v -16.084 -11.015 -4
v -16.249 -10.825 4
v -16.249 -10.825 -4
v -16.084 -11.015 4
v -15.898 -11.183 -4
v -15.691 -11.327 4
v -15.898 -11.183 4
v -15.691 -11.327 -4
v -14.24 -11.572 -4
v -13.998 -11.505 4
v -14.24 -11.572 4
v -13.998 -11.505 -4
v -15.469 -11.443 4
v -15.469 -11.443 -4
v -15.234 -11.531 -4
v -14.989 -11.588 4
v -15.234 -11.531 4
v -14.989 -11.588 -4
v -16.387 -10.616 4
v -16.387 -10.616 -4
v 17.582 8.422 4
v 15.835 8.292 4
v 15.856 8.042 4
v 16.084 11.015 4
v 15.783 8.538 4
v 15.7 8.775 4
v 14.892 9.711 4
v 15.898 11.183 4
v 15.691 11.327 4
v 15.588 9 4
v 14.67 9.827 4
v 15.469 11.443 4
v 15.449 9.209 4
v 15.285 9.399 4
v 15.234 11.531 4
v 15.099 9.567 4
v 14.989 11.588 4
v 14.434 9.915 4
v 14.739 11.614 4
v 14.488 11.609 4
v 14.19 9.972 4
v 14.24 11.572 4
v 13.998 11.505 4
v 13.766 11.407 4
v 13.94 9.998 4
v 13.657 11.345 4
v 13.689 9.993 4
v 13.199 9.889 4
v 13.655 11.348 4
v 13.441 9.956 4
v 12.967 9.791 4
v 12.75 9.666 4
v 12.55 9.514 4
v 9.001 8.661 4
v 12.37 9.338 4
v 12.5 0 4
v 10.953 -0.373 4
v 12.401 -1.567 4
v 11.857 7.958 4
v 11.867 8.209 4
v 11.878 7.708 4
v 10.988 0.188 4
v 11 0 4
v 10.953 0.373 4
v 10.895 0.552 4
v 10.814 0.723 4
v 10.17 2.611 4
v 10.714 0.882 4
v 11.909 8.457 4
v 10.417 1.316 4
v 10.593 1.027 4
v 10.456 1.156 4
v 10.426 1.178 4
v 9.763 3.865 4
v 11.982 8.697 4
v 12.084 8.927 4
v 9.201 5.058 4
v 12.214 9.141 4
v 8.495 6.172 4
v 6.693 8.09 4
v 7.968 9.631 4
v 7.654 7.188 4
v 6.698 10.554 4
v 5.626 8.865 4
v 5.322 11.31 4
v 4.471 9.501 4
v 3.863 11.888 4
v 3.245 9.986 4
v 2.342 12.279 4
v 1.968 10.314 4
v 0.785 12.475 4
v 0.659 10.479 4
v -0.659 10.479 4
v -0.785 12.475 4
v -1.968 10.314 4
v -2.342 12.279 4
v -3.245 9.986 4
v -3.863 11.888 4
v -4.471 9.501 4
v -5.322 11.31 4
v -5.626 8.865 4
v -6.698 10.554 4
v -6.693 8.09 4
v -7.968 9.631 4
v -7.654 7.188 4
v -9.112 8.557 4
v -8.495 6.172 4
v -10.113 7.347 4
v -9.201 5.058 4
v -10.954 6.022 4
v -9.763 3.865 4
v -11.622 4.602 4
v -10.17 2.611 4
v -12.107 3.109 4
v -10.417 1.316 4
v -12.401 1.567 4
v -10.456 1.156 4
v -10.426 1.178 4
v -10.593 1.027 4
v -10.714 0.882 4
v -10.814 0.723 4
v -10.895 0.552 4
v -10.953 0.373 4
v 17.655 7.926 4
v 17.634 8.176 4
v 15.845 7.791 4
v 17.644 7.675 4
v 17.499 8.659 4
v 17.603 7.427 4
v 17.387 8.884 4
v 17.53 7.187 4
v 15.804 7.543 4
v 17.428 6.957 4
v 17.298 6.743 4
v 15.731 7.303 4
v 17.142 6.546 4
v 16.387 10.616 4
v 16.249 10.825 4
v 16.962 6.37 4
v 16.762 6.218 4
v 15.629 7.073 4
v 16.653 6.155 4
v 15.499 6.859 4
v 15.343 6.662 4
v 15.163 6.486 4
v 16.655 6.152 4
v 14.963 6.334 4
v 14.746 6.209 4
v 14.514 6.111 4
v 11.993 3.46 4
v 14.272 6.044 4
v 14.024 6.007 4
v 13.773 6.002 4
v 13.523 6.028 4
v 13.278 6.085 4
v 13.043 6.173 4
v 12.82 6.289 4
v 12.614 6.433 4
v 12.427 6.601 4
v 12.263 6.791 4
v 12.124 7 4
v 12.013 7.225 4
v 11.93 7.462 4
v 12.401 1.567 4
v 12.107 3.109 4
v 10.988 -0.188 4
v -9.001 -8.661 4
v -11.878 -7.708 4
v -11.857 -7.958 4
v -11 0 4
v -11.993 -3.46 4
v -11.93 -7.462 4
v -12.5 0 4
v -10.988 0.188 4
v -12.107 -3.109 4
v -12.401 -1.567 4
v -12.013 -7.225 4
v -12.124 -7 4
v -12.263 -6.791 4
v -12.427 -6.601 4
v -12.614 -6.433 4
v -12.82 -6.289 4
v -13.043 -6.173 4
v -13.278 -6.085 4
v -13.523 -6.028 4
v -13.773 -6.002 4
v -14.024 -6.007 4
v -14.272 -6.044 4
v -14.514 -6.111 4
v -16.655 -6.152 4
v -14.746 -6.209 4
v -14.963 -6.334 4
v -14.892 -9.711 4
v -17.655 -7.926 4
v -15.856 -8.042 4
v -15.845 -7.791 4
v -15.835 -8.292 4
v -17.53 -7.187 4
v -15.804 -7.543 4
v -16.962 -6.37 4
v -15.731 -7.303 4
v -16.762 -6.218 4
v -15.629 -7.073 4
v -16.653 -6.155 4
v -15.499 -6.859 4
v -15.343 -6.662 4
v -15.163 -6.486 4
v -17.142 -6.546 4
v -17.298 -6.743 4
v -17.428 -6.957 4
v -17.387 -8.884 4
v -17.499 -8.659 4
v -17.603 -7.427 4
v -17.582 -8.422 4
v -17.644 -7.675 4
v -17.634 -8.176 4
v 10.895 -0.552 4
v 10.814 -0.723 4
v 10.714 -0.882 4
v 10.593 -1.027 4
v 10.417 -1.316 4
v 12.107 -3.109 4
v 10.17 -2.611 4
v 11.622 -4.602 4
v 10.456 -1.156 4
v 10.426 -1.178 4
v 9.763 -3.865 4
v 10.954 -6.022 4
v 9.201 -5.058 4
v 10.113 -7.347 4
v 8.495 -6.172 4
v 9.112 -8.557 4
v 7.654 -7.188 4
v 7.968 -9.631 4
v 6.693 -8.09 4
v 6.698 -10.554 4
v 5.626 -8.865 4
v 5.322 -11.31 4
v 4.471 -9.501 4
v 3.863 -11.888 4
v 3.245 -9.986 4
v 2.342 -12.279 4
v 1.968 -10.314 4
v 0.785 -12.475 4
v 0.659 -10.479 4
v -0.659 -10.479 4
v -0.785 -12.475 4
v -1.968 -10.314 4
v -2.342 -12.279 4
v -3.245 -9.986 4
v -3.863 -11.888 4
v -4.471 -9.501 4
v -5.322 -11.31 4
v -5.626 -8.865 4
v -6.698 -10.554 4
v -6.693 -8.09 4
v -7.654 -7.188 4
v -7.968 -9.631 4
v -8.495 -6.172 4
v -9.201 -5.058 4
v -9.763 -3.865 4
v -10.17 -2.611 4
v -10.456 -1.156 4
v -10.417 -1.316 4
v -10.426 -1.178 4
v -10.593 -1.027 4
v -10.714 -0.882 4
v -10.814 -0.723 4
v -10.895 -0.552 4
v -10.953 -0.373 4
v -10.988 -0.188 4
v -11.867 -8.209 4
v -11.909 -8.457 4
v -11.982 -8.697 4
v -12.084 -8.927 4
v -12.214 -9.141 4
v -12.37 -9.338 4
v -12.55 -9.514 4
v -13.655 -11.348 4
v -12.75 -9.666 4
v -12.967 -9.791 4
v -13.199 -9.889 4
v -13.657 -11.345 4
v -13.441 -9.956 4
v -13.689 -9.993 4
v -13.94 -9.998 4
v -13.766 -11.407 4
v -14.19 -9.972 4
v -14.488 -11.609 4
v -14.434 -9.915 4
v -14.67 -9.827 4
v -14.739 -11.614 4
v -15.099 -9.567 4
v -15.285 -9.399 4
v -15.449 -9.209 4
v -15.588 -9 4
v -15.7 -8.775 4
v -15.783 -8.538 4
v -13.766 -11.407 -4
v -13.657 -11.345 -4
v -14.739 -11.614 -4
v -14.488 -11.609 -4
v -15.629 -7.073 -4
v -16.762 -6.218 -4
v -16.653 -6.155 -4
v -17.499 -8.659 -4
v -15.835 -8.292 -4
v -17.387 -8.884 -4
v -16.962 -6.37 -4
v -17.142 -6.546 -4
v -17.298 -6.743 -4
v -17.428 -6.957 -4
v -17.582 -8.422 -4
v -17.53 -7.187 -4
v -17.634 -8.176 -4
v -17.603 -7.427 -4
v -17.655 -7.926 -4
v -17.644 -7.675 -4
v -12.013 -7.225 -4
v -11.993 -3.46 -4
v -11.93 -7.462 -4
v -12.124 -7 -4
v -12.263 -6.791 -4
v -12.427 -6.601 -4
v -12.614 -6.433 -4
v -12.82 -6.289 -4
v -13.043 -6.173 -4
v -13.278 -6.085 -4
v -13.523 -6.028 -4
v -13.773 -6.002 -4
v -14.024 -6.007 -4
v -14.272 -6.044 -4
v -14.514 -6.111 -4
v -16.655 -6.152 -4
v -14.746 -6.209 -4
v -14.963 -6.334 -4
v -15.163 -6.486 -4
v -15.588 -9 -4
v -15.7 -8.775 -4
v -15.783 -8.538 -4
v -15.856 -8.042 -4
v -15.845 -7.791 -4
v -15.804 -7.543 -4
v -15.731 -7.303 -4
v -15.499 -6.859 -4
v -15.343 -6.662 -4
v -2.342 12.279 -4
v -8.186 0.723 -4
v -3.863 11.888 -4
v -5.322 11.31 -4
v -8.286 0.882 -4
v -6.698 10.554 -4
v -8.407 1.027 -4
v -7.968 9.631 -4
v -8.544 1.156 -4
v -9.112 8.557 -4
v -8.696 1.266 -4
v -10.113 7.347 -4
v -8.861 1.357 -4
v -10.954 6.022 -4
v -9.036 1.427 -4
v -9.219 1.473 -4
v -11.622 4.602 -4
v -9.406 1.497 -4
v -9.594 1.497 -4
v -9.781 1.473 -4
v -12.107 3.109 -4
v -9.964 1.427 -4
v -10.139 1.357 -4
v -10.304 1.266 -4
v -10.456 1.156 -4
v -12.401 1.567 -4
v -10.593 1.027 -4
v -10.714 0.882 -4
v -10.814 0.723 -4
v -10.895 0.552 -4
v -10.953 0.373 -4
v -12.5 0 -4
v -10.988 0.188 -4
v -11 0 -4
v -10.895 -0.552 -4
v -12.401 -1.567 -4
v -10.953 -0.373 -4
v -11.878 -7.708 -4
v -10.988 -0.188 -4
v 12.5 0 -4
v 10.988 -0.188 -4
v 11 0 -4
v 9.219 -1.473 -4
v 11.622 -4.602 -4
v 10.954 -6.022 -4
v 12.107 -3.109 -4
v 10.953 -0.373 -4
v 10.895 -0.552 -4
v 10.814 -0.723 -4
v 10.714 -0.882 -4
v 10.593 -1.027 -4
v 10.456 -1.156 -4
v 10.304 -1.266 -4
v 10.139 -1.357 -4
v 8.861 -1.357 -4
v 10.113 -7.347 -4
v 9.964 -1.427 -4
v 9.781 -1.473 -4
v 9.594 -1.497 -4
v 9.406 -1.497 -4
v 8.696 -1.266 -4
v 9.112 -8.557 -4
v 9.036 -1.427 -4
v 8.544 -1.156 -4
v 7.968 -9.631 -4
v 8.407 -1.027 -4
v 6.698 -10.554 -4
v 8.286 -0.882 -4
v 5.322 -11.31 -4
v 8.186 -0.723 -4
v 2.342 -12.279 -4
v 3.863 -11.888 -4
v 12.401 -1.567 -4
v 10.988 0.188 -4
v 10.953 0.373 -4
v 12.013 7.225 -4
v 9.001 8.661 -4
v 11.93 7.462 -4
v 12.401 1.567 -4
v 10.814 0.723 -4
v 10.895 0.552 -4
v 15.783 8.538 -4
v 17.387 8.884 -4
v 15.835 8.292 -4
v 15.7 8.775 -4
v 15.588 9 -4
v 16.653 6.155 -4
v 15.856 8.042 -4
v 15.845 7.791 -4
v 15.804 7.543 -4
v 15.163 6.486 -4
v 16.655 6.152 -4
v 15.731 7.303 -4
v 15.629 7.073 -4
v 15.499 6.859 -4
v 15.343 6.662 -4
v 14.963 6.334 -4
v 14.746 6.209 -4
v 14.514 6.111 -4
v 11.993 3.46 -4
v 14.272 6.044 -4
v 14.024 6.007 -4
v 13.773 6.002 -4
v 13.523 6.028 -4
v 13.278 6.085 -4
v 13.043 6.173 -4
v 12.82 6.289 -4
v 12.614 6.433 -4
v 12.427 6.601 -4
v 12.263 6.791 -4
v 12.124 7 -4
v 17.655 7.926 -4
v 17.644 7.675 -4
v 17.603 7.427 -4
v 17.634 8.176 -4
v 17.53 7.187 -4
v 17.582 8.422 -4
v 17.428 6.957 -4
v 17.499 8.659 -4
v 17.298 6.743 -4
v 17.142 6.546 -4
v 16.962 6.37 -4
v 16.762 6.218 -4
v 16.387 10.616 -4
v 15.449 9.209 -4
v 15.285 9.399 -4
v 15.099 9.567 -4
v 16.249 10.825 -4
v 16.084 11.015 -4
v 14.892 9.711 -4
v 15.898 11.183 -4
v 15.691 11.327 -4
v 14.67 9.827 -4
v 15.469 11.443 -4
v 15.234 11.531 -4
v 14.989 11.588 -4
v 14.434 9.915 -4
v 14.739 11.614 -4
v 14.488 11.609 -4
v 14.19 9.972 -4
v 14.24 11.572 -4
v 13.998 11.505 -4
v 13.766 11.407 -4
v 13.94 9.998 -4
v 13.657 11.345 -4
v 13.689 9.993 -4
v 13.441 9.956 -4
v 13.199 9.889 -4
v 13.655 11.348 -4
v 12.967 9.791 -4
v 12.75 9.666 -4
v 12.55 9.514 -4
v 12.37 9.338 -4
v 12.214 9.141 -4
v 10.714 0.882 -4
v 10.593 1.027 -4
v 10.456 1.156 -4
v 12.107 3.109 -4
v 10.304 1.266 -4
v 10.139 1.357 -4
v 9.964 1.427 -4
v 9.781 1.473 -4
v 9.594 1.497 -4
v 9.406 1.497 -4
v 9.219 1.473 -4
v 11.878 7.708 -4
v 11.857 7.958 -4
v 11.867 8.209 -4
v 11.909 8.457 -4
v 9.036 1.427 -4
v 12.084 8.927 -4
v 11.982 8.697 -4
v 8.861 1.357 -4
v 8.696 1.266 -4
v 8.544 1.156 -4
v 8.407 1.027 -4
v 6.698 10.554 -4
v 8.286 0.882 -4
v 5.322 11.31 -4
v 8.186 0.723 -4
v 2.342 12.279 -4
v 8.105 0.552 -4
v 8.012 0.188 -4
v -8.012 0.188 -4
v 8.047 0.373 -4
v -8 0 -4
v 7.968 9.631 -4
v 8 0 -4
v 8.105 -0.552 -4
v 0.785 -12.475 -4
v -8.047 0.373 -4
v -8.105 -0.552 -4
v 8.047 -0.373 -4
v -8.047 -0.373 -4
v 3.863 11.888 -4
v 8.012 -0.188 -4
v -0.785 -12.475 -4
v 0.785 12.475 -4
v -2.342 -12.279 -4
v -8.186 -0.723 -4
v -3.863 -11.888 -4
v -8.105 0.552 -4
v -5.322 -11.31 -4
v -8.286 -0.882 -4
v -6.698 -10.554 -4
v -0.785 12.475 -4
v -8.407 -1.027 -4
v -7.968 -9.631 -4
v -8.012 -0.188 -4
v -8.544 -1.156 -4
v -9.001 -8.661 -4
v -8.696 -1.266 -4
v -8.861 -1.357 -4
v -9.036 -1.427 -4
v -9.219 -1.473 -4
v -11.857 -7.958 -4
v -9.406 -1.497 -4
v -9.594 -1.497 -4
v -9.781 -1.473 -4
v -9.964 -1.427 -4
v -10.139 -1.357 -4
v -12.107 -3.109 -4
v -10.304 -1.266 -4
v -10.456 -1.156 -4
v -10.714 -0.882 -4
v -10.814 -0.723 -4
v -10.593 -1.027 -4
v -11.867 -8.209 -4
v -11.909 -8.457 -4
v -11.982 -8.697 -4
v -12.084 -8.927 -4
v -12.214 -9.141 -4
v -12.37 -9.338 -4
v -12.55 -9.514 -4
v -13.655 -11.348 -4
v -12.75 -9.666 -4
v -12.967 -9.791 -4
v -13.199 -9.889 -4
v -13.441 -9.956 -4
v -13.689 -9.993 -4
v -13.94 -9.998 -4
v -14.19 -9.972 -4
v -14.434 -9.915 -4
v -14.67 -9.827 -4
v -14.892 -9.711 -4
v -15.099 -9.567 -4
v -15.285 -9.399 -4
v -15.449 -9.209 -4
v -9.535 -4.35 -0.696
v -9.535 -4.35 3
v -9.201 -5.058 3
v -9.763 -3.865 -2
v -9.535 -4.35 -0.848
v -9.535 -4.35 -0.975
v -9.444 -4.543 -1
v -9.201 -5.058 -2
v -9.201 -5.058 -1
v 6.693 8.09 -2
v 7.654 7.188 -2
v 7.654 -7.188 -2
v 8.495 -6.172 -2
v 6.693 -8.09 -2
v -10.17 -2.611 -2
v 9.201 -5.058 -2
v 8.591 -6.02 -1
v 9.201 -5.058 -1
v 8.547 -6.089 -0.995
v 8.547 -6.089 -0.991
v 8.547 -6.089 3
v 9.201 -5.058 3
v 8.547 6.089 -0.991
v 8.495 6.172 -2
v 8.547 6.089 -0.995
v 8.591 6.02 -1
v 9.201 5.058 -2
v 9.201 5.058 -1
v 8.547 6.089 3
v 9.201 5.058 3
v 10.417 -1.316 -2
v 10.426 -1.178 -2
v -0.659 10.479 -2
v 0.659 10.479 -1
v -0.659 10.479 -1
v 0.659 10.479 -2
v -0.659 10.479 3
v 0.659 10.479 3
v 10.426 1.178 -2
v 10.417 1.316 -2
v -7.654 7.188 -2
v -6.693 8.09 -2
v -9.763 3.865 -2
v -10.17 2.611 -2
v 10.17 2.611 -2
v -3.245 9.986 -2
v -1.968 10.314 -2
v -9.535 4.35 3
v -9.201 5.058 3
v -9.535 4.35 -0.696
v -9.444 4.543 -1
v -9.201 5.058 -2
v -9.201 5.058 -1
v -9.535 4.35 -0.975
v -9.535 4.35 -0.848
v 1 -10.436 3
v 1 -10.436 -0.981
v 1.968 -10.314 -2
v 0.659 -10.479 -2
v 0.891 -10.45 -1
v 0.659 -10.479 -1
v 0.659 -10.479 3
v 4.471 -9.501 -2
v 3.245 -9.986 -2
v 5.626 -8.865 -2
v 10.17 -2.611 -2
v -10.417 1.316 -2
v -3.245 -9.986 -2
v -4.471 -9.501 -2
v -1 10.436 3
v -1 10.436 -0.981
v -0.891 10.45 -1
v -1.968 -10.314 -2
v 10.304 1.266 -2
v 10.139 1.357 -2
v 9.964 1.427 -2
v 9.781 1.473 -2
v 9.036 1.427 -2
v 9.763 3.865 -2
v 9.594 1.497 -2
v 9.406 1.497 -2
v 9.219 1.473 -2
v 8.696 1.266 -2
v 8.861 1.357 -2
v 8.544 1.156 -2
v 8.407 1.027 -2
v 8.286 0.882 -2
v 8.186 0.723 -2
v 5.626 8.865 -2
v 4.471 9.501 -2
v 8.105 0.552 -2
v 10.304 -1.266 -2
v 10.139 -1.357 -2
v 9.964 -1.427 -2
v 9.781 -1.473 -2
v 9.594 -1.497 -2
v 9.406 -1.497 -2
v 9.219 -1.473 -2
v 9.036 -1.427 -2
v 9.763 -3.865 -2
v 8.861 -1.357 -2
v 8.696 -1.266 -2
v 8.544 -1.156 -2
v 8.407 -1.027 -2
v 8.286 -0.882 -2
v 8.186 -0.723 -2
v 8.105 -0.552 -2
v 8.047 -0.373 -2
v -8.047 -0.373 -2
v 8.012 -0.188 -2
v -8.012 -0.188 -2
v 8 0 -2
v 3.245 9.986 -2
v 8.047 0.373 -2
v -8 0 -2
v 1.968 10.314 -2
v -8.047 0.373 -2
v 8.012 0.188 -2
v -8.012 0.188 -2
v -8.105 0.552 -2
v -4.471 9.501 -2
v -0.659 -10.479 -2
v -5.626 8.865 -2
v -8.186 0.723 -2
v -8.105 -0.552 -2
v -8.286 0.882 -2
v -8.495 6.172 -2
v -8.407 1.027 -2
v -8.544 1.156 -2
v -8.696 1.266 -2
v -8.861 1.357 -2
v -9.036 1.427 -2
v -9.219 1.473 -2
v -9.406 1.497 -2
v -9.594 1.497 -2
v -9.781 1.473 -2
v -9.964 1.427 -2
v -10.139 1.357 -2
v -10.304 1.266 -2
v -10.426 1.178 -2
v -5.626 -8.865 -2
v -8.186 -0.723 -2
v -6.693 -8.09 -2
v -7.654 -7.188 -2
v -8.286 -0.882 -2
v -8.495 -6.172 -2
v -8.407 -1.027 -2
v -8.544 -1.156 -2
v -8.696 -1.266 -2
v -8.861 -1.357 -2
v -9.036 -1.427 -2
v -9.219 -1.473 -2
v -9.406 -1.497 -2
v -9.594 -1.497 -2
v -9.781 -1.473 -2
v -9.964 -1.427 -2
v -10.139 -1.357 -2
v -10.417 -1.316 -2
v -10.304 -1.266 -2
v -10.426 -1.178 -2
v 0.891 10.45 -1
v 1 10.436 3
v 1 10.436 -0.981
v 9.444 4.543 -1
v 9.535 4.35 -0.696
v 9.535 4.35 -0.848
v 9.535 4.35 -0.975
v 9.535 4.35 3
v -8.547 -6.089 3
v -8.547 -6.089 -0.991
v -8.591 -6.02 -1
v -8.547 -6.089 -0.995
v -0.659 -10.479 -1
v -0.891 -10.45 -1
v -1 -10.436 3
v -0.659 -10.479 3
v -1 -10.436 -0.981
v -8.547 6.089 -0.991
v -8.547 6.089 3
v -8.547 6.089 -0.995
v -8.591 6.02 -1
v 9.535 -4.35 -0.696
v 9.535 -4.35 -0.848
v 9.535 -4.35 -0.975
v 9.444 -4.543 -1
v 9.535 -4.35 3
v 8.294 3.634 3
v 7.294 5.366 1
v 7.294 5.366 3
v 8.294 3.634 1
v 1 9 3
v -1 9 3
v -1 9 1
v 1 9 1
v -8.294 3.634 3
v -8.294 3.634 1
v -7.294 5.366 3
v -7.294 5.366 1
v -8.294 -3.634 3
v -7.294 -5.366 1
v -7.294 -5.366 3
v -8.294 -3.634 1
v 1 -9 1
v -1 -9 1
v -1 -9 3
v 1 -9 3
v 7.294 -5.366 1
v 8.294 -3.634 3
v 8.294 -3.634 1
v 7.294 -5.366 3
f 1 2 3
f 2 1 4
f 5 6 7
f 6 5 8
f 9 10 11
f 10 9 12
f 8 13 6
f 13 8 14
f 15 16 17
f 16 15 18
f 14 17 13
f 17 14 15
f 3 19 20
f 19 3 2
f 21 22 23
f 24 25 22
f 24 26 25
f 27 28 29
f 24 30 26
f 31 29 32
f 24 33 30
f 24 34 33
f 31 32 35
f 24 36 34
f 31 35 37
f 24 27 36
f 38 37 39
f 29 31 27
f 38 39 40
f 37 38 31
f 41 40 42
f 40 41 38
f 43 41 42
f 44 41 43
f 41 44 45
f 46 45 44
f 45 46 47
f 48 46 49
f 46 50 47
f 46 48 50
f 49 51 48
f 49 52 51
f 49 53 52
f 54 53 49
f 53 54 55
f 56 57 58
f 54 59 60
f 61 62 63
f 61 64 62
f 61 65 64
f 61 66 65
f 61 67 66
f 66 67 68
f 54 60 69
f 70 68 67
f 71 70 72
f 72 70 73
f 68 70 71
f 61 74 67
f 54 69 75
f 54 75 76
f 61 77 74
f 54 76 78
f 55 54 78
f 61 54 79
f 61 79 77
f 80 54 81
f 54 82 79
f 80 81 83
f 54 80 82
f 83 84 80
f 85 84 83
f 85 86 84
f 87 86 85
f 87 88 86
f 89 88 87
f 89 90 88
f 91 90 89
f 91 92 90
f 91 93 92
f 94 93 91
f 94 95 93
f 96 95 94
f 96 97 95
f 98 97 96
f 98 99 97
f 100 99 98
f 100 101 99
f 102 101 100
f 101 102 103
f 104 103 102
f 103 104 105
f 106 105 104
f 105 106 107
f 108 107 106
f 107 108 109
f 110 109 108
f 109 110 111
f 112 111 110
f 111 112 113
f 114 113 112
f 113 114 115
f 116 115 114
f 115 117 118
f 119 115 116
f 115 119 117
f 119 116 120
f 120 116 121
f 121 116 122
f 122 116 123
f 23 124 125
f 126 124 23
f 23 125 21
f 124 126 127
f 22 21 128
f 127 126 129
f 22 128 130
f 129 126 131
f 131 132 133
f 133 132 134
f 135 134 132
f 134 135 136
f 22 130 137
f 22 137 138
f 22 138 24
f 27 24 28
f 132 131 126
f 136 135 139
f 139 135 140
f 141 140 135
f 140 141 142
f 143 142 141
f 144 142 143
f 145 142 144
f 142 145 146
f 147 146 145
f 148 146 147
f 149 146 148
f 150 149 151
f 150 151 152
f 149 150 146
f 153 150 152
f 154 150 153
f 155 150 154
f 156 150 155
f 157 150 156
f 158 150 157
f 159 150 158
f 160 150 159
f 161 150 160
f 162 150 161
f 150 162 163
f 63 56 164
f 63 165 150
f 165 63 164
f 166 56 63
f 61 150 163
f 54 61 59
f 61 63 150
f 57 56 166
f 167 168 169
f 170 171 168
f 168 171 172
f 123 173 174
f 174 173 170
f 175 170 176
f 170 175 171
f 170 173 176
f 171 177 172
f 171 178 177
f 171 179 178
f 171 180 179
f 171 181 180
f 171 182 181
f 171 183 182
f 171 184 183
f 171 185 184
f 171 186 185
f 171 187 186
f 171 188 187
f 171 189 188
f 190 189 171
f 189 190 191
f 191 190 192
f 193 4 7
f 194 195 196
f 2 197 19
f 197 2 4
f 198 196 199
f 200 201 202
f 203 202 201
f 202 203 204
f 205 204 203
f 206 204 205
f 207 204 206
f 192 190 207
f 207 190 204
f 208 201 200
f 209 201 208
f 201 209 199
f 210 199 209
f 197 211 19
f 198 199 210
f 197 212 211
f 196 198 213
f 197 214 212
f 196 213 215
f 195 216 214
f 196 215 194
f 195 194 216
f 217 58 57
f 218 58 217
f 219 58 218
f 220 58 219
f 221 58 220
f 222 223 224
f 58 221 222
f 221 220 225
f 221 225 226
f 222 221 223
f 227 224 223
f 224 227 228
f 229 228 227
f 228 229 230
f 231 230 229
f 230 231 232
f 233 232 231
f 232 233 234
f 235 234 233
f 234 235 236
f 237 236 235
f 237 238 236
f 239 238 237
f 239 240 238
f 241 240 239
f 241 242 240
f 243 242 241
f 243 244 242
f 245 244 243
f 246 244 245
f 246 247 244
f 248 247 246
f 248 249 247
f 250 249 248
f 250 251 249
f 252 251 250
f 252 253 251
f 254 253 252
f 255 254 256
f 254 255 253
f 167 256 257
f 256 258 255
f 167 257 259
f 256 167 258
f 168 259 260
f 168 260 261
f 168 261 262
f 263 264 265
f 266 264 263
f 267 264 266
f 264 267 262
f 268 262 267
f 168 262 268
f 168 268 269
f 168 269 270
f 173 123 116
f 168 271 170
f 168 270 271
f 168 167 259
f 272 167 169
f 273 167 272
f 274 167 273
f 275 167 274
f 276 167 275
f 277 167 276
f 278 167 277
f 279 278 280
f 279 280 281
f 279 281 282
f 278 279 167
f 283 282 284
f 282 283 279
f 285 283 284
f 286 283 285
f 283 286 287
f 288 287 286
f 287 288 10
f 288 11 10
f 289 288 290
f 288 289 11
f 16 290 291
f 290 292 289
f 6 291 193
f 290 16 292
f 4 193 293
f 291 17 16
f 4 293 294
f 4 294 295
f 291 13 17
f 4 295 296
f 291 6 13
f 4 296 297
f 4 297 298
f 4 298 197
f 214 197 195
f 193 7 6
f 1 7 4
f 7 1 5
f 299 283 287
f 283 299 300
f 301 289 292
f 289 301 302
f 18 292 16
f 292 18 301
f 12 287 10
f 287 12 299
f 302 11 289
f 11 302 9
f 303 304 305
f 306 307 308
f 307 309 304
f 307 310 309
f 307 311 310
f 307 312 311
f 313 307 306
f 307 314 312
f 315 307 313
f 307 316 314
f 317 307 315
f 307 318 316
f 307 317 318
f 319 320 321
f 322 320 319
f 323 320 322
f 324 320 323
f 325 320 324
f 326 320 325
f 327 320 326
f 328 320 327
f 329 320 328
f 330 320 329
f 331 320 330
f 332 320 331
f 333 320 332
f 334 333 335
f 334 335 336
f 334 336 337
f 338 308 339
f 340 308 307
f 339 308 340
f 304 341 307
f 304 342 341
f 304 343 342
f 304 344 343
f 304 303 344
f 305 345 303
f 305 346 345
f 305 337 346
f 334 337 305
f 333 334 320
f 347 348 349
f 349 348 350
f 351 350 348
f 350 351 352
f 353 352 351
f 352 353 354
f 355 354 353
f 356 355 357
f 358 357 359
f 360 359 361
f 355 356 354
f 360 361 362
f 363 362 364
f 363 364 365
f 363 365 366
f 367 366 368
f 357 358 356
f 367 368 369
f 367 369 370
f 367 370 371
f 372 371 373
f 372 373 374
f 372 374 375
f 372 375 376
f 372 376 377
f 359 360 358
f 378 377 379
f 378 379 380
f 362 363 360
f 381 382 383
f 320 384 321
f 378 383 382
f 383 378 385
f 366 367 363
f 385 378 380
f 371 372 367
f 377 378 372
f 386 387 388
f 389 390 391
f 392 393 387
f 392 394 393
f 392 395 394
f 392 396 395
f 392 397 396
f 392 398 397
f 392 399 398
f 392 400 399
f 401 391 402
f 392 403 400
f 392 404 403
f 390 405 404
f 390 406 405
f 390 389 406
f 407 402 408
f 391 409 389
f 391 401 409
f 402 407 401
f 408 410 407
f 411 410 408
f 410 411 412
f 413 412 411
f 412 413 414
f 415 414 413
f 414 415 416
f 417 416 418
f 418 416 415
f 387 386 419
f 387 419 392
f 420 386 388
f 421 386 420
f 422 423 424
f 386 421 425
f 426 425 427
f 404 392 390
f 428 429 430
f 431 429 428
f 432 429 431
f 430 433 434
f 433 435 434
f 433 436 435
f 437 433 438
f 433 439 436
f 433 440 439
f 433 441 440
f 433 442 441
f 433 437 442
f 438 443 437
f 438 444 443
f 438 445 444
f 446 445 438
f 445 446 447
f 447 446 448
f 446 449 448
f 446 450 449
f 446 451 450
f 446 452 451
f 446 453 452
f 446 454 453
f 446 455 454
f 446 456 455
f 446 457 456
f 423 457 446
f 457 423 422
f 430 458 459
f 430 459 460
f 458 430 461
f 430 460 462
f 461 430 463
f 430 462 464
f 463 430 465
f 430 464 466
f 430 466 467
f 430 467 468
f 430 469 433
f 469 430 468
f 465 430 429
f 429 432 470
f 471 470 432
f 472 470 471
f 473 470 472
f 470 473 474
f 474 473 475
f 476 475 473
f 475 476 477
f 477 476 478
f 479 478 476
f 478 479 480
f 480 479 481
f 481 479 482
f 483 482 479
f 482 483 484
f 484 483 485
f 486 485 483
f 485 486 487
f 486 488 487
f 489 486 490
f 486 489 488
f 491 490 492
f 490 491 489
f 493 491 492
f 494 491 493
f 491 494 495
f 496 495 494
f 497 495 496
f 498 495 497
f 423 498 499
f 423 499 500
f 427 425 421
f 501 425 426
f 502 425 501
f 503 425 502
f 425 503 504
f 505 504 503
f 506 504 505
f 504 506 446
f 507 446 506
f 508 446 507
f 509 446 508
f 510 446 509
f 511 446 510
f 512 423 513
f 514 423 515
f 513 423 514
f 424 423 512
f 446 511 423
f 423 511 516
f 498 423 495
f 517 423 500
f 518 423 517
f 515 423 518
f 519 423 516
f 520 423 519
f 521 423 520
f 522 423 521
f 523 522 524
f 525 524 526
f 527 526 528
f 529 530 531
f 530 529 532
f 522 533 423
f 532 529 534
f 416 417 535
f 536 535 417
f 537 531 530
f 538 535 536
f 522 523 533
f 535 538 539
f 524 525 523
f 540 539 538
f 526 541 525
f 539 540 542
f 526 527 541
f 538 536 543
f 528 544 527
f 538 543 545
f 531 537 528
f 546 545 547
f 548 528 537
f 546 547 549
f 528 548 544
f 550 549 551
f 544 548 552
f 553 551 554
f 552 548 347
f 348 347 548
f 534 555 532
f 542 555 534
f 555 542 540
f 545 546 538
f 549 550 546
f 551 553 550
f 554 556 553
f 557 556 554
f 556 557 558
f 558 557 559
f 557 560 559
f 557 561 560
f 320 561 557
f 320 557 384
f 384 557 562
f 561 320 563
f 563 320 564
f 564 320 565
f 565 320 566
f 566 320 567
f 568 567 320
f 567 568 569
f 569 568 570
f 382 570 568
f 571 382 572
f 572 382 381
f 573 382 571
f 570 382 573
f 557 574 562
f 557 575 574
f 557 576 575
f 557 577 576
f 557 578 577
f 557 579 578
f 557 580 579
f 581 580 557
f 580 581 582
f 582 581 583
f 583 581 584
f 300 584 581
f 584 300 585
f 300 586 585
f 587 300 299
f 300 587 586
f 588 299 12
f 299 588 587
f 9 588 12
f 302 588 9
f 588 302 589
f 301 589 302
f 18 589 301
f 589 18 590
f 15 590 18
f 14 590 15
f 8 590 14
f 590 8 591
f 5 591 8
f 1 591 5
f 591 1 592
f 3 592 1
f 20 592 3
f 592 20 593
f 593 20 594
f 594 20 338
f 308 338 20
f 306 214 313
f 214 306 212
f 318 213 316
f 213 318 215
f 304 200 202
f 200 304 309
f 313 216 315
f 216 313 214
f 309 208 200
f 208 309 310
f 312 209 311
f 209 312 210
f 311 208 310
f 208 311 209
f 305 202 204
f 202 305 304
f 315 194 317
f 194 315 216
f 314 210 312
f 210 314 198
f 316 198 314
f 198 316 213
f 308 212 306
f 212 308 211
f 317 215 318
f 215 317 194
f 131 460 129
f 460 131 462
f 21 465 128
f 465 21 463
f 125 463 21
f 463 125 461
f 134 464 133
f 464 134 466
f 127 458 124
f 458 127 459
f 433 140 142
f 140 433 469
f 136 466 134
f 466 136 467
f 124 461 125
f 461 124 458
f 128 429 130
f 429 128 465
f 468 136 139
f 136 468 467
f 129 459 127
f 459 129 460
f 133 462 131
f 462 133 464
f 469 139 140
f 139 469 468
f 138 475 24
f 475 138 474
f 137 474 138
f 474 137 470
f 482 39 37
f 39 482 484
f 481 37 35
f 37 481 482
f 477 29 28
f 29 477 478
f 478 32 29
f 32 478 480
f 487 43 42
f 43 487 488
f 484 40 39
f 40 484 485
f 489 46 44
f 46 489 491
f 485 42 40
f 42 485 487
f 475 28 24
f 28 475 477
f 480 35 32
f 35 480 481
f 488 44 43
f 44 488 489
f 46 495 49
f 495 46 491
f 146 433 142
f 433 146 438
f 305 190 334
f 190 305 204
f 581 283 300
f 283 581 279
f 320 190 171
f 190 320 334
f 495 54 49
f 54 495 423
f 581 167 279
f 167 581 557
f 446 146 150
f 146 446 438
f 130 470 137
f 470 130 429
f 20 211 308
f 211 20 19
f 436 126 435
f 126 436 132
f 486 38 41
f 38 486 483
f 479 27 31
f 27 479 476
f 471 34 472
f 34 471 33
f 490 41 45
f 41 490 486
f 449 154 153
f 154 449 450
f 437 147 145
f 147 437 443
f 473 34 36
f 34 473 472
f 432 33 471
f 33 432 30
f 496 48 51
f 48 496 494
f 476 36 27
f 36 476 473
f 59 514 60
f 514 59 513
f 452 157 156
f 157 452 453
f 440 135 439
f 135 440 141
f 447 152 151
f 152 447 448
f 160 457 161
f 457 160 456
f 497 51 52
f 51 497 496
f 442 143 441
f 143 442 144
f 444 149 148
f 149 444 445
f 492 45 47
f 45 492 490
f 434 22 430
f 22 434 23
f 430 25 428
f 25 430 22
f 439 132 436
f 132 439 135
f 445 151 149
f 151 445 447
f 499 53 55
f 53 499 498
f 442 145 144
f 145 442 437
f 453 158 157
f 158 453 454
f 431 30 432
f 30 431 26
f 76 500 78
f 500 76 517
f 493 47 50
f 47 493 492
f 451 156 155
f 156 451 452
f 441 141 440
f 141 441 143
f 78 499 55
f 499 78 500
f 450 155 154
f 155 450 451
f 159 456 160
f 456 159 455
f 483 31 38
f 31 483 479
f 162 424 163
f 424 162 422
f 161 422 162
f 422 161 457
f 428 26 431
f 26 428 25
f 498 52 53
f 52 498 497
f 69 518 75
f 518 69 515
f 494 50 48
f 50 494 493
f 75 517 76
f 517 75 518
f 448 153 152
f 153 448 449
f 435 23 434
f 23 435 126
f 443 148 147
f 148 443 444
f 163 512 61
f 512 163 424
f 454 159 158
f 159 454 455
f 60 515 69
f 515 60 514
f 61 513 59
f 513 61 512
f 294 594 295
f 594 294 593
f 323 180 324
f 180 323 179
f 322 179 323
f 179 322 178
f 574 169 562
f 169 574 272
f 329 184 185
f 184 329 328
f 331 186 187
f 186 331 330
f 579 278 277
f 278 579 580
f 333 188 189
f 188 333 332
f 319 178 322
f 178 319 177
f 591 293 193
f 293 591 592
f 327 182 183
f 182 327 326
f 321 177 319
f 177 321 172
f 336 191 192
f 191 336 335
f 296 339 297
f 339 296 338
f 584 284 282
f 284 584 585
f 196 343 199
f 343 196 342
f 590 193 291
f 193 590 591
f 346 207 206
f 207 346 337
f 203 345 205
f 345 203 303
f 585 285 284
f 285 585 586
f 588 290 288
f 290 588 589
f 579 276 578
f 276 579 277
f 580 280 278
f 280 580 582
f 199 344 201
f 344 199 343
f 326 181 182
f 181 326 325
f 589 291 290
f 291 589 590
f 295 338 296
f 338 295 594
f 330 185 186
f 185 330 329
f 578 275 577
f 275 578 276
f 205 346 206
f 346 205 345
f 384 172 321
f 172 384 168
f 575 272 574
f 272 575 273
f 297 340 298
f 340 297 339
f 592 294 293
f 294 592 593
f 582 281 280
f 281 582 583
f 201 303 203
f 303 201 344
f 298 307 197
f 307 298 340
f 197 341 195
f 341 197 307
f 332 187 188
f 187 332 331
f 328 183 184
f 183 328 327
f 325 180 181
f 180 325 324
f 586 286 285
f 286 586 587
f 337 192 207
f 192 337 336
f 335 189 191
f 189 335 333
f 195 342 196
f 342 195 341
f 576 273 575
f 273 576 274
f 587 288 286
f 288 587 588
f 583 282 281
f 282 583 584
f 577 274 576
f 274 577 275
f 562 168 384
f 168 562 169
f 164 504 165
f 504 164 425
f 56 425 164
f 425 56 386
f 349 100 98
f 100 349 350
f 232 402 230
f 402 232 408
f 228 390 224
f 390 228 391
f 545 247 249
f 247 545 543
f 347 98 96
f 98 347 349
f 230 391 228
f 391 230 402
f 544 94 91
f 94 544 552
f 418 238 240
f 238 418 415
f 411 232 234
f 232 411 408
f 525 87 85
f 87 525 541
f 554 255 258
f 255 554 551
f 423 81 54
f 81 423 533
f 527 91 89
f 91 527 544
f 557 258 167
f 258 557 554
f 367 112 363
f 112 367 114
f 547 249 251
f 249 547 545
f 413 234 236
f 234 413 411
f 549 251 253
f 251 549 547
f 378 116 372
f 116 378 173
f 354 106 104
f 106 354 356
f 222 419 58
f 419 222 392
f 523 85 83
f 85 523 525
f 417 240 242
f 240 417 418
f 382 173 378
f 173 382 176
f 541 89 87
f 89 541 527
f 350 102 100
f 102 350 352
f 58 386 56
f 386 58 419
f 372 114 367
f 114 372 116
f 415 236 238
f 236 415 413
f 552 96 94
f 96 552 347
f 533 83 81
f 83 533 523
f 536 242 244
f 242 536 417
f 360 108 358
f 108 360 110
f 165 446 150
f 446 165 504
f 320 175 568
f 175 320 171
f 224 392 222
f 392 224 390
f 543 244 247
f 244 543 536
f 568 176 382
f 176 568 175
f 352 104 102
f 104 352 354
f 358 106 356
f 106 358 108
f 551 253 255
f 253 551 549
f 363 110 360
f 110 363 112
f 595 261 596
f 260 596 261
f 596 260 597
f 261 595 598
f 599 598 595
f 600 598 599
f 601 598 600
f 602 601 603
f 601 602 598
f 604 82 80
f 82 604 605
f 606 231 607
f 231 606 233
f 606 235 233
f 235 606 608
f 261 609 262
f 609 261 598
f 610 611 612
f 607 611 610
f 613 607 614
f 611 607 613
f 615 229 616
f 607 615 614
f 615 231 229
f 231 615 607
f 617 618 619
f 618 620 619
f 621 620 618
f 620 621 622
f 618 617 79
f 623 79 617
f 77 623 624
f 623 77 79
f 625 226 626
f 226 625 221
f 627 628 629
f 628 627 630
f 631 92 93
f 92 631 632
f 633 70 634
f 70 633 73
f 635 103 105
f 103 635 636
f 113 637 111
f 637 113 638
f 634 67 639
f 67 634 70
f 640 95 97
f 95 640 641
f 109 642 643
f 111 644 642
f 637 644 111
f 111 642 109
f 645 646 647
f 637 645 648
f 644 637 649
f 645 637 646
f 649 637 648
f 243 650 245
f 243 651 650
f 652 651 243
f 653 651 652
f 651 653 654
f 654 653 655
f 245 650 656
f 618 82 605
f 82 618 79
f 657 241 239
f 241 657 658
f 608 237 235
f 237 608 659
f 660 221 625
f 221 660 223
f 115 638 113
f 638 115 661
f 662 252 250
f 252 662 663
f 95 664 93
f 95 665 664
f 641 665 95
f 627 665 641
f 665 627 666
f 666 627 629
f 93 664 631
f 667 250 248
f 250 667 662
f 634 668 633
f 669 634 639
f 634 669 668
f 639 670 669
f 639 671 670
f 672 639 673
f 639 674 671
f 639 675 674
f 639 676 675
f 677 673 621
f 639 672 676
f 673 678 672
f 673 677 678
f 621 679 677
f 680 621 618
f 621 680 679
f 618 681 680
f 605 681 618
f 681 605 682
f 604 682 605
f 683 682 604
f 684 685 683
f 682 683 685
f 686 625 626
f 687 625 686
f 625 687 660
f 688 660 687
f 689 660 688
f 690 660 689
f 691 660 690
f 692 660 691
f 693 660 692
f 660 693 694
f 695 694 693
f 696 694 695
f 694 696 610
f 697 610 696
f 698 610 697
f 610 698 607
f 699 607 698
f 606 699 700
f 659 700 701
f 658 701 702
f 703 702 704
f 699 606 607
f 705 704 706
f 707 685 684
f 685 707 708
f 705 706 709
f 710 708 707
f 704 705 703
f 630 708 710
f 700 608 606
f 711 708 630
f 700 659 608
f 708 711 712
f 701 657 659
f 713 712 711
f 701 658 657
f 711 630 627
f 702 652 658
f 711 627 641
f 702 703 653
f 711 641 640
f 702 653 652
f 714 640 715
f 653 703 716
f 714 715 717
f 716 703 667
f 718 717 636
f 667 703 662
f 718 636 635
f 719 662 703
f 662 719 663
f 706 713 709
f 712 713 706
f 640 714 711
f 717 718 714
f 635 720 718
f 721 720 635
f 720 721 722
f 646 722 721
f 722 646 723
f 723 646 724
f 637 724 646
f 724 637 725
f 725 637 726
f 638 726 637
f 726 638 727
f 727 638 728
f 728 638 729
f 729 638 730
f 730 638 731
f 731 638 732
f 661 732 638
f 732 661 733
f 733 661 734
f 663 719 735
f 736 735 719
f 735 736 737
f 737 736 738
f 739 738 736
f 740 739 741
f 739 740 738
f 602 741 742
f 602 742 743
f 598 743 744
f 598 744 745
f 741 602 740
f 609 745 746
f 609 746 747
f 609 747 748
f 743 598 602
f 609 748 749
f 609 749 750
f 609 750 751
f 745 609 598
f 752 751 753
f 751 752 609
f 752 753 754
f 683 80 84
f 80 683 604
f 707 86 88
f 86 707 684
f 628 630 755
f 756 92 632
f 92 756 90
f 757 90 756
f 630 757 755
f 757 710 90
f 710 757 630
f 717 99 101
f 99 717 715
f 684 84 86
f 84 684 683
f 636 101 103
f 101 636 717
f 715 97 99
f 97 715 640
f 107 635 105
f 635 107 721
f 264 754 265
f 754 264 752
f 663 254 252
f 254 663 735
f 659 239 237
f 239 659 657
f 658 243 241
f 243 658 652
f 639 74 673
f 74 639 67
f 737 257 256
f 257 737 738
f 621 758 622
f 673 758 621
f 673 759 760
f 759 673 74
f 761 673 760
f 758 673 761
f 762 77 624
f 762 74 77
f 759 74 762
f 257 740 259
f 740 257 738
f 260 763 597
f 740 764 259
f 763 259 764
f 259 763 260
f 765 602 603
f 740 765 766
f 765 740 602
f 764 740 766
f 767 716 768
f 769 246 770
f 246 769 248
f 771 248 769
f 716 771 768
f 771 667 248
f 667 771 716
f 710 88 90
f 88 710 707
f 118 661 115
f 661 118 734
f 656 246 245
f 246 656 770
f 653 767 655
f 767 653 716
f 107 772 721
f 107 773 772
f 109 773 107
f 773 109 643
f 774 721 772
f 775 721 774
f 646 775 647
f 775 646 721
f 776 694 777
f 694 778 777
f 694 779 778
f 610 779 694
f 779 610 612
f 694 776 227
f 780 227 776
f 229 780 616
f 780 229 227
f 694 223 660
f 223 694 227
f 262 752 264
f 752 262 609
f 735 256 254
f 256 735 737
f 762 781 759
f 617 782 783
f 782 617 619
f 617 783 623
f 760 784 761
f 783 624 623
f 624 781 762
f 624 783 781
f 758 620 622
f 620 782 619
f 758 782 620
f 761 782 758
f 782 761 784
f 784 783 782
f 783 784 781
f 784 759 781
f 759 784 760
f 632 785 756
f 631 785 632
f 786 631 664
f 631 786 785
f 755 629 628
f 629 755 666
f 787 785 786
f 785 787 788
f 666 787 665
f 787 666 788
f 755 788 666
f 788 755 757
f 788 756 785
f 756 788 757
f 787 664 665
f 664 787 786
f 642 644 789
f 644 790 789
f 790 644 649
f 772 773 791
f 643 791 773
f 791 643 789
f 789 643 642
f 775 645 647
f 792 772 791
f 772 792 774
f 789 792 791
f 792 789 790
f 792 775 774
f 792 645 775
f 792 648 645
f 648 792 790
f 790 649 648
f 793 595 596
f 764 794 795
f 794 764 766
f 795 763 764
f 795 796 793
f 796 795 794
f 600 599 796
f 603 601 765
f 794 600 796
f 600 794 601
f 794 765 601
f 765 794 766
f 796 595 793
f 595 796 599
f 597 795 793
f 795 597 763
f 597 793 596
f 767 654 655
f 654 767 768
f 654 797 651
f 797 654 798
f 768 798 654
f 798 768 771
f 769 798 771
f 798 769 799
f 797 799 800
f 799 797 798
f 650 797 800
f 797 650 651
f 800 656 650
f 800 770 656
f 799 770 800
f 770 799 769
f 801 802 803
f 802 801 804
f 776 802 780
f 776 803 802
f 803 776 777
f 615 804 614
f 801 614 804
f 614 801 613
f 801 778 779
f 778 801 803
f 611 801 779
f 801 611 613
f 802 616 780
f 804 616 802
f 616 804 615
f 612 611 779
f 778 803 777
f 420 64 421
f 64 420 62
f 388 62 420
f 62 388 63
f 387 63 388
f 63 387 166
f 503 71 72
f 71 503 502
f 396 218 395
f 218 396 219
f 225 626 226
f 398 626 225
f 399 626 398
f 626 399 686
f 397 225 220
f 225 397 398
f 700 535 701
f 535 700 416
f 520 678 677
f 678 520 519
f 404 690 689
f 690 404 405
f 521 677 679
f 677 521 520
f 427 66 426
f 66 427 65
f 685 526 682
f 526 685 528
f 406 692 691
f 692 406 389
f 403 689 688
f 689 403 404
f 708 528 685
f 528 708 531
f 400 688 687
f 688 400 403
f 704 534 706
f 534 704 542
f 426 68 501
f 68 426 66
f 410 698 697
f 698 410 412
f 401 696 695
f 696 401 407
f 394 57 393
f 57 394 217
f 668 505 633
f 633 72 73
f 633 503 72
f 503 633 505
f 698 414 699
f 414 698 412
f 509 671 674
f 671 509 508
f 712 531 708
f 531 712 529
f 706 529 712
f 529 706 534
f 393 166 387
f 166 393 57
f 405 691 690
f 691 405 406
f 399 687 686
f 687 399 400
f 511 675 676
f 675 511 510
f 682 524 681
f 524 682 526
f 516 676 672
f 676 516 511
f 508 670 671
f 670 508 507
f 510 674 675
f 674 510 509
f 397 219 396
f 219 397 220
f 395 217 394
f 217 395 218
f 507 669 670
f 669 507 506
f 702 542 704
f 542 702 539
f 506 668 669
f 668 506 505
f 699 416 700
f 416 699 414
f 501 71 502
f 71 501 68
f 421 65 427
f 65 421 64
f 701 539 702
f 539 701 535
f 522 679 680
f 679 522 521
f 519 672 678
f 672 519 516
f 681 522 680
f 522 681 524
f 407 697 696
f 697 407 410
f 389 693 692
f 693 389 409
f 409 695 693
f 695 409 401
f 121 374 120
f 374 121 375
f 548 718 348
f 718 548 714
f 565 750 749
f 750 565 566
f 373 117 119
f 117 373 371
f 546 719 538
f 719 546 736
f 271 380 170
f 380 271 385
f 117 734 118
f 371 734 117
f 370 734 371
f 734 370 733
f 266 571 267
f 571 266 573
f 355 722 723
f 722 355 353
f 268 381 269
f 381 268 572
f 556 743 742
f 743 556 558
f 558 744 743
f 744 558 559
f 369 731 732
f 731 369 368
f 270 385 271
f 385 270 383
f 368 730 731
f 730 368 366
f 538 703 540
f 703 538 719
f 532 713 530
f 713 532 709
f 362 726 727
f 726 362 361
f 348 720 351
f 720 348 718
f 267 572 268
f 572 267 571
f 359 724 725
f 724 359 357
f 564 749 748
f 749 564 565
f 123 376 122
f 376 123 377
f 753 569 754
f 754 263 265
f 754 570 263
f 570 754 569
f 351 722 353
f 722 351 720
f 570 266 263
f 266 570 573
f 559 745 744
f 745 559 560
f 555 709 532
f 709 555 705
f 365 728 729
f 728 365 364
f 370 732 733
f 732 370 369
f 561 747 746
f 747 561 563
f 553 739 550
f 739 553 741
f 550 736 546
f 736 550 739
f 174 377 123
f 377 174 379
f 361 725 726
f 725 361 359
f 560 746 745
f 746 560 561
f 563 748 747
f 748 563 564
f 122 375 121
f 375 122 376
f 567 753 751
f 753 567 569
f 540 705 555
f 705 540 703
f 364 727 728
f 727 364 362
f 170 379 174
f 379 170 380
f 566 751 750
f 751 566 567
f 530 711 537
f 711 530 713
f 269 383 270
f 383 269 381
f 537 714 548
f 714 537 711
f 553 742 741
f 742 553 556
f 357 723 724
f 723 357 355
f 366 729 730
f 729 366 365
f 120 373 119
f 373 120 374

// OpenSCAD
use <MCAD/boxes.scad>


$fn = 50;

wall = 2;
int_d = 21;
int_h = 6;
ext_d = int_d + wall * 2;
ext_h = int_h + wall;

hole_d = 4;
ext_size = hole_d+wall+1;

module led_pcb_holder() {

  difference() {
    union() {
      difference() {
        union() {
          cylinder(d=ext_d, h=ext_h, center = true);
          rotate([0, 0, 30]) {
            translate([0, 0, (-ext_h+wall)/2]) {
              translate([0, 0, (ext_h-wall)/2]) {
                difference() {
                  roundedBox([ext_d+ext_size*2, hole_d + wall, ext_h], wall, true);
                  translate([(ext_d+ext_size)/2, 0, 0]) {
                    cylinder(d=hole_d, h=50, center=true);
                  }
                  translate([-(ext_d+ext_size)/2, 0, 0]) {
                    cylinder(d=hole_d, h=50, center=true);
                  }
                }
              }
            }
          }
        }
        translate([0, 0, (ext_h-int_h)/2]) {
          cylinder(d=int_d, h=int_h, center = true);
        }
      }
      for(p=[0:60:360]) {
        rotate([0, 0, p+30]) {
          translate([int_d/2, 0, -int_h/2+wall+3]) {
            hull() {
              cube([3, 2, 2], center=true);
              translate([0, 0, -2]) {
                cube([0.1, 2, 2], center=true);
              }
            }
          }
        }
      }
    }
    translate([0, 0, (ext_h-int_h)/2]) {
      for(p=[0,180]) {
        rotate([0, 0, p]) {
          translate([int_d/2-1, 0, 0]) {
            cylinder(d=3, h=50, center=true);
          }
        }
      }
    }
  }
  
  
}

led_pcb_holder();
